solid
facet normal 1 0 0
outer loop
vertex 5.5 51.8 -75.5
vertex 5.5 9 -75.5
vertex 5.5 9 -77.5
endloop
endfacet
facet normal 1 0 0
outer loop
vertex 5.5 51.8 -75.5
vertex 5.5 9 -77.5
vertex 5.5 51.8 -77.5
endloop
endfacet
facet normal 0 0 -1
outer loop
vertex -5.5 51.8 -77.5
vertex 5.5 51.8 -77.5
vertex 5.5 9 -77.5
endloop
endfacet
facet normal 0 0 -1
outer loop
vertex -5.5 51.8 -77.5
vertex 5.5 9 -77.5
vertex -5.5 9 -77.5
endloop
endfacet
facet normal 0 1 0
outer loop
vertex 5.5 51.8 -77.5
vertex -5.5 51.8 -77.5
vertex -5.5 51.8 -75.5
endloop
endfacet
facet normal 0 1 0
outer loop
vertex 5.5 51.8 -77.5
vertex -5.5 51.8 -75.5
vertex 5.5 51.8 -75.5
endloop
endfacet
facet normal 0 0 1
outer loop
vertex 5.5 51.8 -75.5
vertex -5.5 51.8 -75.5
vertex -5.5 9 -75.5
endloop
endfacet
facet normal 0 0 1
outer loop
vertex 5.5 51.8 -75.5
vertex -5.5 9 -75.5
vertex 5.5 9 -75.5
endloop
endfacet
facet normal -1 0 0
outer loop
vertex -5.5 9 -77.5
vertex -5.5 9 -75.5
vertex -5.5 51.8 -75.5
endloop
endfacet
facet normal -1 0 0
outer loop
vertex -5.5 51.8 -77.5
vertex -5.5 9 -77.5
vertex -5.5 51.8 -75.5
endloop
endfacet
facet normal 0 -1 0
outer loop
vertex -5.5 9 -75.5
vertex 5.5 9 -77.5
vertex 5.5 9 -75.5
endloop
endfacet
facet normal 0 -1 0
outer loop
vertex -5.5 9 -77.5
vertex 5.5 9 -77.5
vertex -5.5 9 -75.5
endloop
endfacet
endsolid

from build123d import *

# Parameters (mm, degrees)
SKETCH1_W                       = 39
SKETCH1_H                       = 155
BOSS_EXTRUDE1_DEPTH             = 2
BOSS_EXTRUDE2_DEPTH             = 58
SKETCH3_W                       = 2
SKETCH3_H                       = 2
BOSS_EXTRUDE3_DEPTH             = 58
SKETCH4_W                       = 2
SKETCH4_H                       = 2
BOSS_EXTRUDE4_DEPTH             = 151
SKETCH6_W                       = 35
SKETCH6_H                       = 2.2
CUT_EXTRUDE1_DEPTH              = 166.496978824
SKETCH7_W                       = 35
SKETCH7_H                       = 2.2
CUT_EXTRUDE2_DEPTH              = 99.744620107
SKETCH5_W                       = 31
SKETCH5_H                       = 2
BOSS_EXTRUDE5_DEPTH             = 2
BOSS_EXTRUDE6_REACH             = 101.932
SKETCH8_W                       = 2
SKETCH8_H                       = 2
BOSS_EXTRUDE6_DIRECTION_2_REACH = 101.932
SKETCH10_W                      = 2
SKETCH10_H                      = 2.2
SKETCH10_W_2                    = 2.2
SKETCH10_H_2                    = 2
BOSS_EXTRUDE8_DEPTH             = 2
SKETCH11_W                      = 2
SKETCH11_H                      = 2.2
SKETCH11_W_2                    = 2.2
SKETCH11_H_2                    = 2
BOSS_EXTRUDE9_DEPTH             = 2
FILLET2_R                       = 2.5
SKETCH14_W                      = 36.5
SKETCH14_H                      = 7.75
BOSS_EXTRUDE10_DEPTH            = 2
SKETCH13_W                      = 31
SKETCH13_H                      = 3
CUT_EXTRUDE4_DEPTH              = 2
FILLET3_R                       = 2
FILLET4_R                       = 0.5
SKETCH15_R                      = 5.1
CUT_EXTRUDE5_DEPTH              = 100.932477203
SKETCH16_R                      = 7.1
BOSS_EXTRUDE11_DEPTH            = 1
FILLET5_R                       = 0.5
FILLET7_R                       = 0.5
CUT_EXTRUDE6_DEPTH              = 100.932477263
CUT_EXTRUDE6_DEPTH_BACK         = 100.932477263
SKETCH18_W                      = 9
SKETCH18_H                      = 51
CUT_EXTRUDE7_DEPTH              = 100.078251902
CUT_EXTRUDE8_DEPTH              = 61.284741021
CUT_EXTRUDE8_DEPTH_BACK         = 61.284741021
SKETCH19_W                      = 11
SKETCH19_H                      = 8.2


with BuildPart() as part:
    # Sketch1 → Boss-Extrude1 (new body)
    with BuildSketch(Plane(origin=(0, 0, 0), x_dir=(1, 0, 0), z_dir=(0, 1, 0))):
        Rectangle(SKETCH1_W, SKETCH1_H)
    extrude(amount=BOSS_EXTRUDE1_DEPTH)

    # Sketch2 → Boss-Extrude2 (add)
    with BuildSketch(Plane(origin=(0, 2, 0), x_dir=(1, 0, 0), z_dir=(0, 1, 0))):
        Polygon((-17.5, -77.5), (-17.5, -75.5), (-17.5, 75.5), (17.5, 75.5), (17.5, -75.5), (17.5, -77.5), (19.5, -77.5), (19.5, 77.5), (-19.5, 77.5), (-19.5, -77.5), align=None)
    extrude(amount=BOSS_EXTRUDE2_DEPTH)

    # Sketch3 → Boss-Extrude3 (add)
    with BuildSketch(Plane(origin=(0, 2, 0), x_dir=(1, 0, 0), z_dir=(0, 1, 0))):
        with Locations((-16.5, -76.5)):
            Rectangle(SKETCH3_W, SKETCH3_H)
        with Locations((-16.5, -72.3)):
            Rectangle(SKETCH3_W, SKETCH3_H)
        with Locations((16.5, -76.5)):
            Rectangle(SKETCH3_W, SKETCH3_H)
        with Locations((16.5, -72.3)):
            Rectangle(SKETCH3_W, SKETCH3_H)
    extrude(amount=BOSS_EXTRUDE3_DEPTH)

    # Sketch4 → Boss-Extrude4 (add)
    with BuildSketch(Plane.XY.offset(-75.5)):
        with Locations((-16.5, 59)):
            Rectangle(SKETCH4_W, SKETCH4_H)
        Polygon((-15.5, 53.8), (-17.5, 51.8), (-17.5, 55.8), (-15.5, 55.8), align=None)
        Polygon((15.5, 55.8), (17.5, 55.8), (17.5, 51.8), (15.5, 53.8), align=None)
        with Locations((16.5, 59)):
            Rectangle(SKETCH4_W, SKETCH4_H)
    extrude(amount=BOSS_EXTRUDE4_DEPTH)

    # Sketch6 → Cut-Extrude1 (cut, through all)
    with BuildSketch(Plane.XY.offset(-75.5)):
        with Locations((0, 56.9)):
            Rectangle(SKETCH6_W, SKETCH6_H)
    extrude(amount=CUT_EXTRUDE1_DEPTH, mode=Mode.SUBTRACT)

    # Sketch7 → Cut-Extrude2 (cut, through all)
    with BuildSketch(Plane(origin=(0, 2, 0), x_dir=(1, 0, 0), z_dir=(0, 1, 0))):
        with Locations((0, -74.4)):
            Rectangle(SKETCH7_W, SKETCH7_H)
    extrude(amount=CUT_EXTRUDE2_DEPTH, mode=Mode.SUBTRACT)

    # Sketch5 → Boss-Extrude5 (add)
    with BuildSketch(Plane(origin=(0, 2, 0), x_dir=(1, 0, 0), z_dir=(0, 1, 0))):
        with Locations((0, -76.5)):
            Rectangle(SKETCH5_W, SKETCH5_H)
        with Locations((0, -72.3)):
            Rectangle(SKETCH5_W, SKETCH5_H)
    extrude(amount=BOSS_EXTRUDE5_DEPTH)

    # Boss-Extrude6: up to this face of the body (flat: up to its plane)
    boss_extrude6_end = Plane(part.part.faces().sort_by_distance((17.5, 26.9, -2.1))[0])
    # Sketch8 → Boss-Extrude6 (add, up to the picked face)
    with BuildSketch(Plane(origin=(0, 0, 0), x_dir=(0, 0, -1), z_dir=(1, 0, 0)), mode=Mode.PRIVATE) as boss_extrude6_sk1:
        with Locations((74.5, 59)):
            Rectangle(SKETCH8_W, SKETCH8_H)
    boss_extrude6_tool1 = split(extrude(boss_extrude6_sk1.sketch, amount=BOSS_EXTRUDE6_REACH, mode=Mode.PRIVATE), bisect_by=boss_extrude6_end, keep=Keep.BOTH, mode=Mode.PRIVATE)
    # Sketch8 → Boss-Extrude6 (add, up to the picked face)
    with BuildSketch(Plane(origin=(0, 0, 0), x_dir=(0, 0, -1), z_dir=(1, 0, 0)), mode=Mode.PRIVATE) as boss_extrude6_sk2:
        Polygon((75.5, 55.8), (73.5, 55.8), (73.5, 53.8), (75.5, 51.8), align=None)
    boss_extrude6_tool2 = split(extrude(boss_extrude6_sk2.sketch, amount=BOSS_EXTRUDE6_REACH, mode=Mode.PRIVATE), bisect_by=boss_extrude6_end, keep=Keep.BOTH, mode=Mode.PRIVATE)
    add(boss_extrude6_tool1.solids().sort_by(Axis((0, 59, -74.5), (1, 0, 0)))[0])
    add(boss_extrude6_tool2.solids().sort_by(Axis((0, 54.244444, -74.611111), (1, 0, 0)))[0])

    # Boss-Extrude6 direction 2: up to this face of the body (flat: up to its plane)
    boss_extrude6_direction_2_end = Plane(part.part.faces().sort_by_distance((-17.5, 26.9, -2.1))[0])
    # Sketch8 → Boss-Extrude6 direction 2 (add, up to the picked face)
    with BuildSketch(Plane(origin=(0, 0, 0), x_dir=(0, 0, -1), z_dir=(1, 0, 0)), mode=Mode.PRIVATE) as boss_extrude6_direction_2_sk1:
        with Locations((74.5, 59)):
            Rectangle(SKETCH8_W, SKETCH8_H)
    boss_extrude6_direction_2_tool1 = split(extrude(boss_extrude6_direction_2_sk1.sketch, amount=-BOSS_EXTRUDE6_DIRECTION_2_REACH, mode=Mode.PRIVATE), bisect_by=boss_extrude6_direction_2_end, keep=Keep.BOTH, mode=Mode.PRIVATE)
    # Sketch8 → Boss-Extrude6 direction 2 (add, up to the picked face)
    with BuildSketch(Plane(origin=(0, 0, 0), x_dir=(0, 0, -1), z_dir=(1, 0, 0)), mode=Mode.PRIVATE) as boss_extrude6_direction_2_sk2:
        Polygon((75.5, 55.8), (73.5, 55.8), (73.5, 53.8), (75.5, 51.8), align=None)
    boss_extrude6_direction_2_tool2 = split(extrude(boss_extrude6_direction_2_sk2.sketch, amount=-BOSS_EXTRUDE6_DIRECTION_2_REACH, mode=Mode.PRIVATE), bisect_by=boss_extrude6_direction_2_end, keep=Keep.BOTH, mode=Mode.PRIVATE)
    add(boss_extrude6_direction_2_tool1.solids().sort_by(Axis((0, 59, -74.5), (-1, 0, 0)))[0])
    add(boss_extrude6_direction_2_tool2.solids().sort_by(Axis((0, 54.244444, -74.611111), (-1, 0, 0)))[0])

    # Sketch10 → Boss-Extrude8 (add)
    with BuildSketch(Plane(origin=(-17.5, 0, 0), x_dir=(0, 0, -1), z_dir=(1, 0, 0))):
        with Locations((-76.5, 56.9)):
            Rectangle(SKETCH10_W, SKETCH10_H)
        with Locations((-74.4, 59)):
            Rectangle(SKETCH10_W_2, SKETCH10_H_2)
    extrude(amount=BOSS_EXTRUDE8_DEPTH)

    # Sketch11 → Boss-Extrude9 (add)
    with BuildSketch(Plane.ZY.offset(-17.5)):
        with Locations((76.5, 56.9)):
            Rectangle(SKETCH11_W, SKETCH11_H)
        with Locations((74.4, 59)):
            Rectangle(SKETCH11_W_2, SKETCH11_H_2)
    extrude(amount=BOSS_EXTRUDE9_DEPTH)

    # Fillet2
    fillet2_edges = [part.edges().sort_by_distance(p)[0] for p in [
        (-17.5, 26.9, 71.3),
        (17.5, 26.9, 71.3),
        (19.5, 30, 77.5),
        (-19.5, 30, 77.5),
        (-19.5, 30, -77.5),
        (-17.5, 26.9, -75.5),
        (17.5, 26.9, -75.5),
        (19.5, 30, -77.5),
        (19.5, 60, 0),
        (-19.5, 60, 0),
        (19.5, 0, 0),
        (-19.5, 0, 0),
        (0, 60, -77.5),
        (0, 0, 77.5),
        (0, 0, -77.5),
        (-17.5, 60, 77.5),
        (17.5, 60, 77.5),
    ]]
    fillet(fillet2_edges, radius=FILLET2_R)

    # Sketch14 → Boss-Extrude10 (add)
    with BuildSketch(Plane.XY.offset(-75.5)):
        with Locations((0, 5.125)):
            Rectangle(SKETCH14_W, SKETCH14_H)
    extrude(amount=BOSS_EXTRUDE10_DEPTH)

    # Sketch13 → Cut-Extrude4 (cut)
    with BuildSketch(Plane(origin=(0, 0, -77.5), x_dir=(-1, 0, 0), z_dir=(0, 0, -1))):
        with Locations((0, 5.5)):
            Rectangle(SKETCH13_W, SKETCH13_H)
    extrude(amount=-CUT_EXTRUDE4_DEPTH, mode=Mode.SUBTRACT)

    # Fillet3
    fillet3_edges = [part.edges().sort_by_distance(p)[0] for p in [
        (0, 9, -73.5),
    ]]
    fillet(fillet3_edges, radius=FILLET3_R - 0.0001)  # a hair under: the kernel refuses the full size

    # Fillet4
    fillet4_edges = [part.edges().sort_by_distance(p)[0] for p in [
        (15.5, 5.5, -75.5),
        (15.5, 4, -76.5),
        (0, 7, -75.5),
        (15.5, 7, -76.5),
        (-15.5, 5.5, -75.5),
        (-15.5, 7, -76.5),
        (0, 4, -75.5),
        (-15.5, 4, -76.5),
        (15.5, 5.5, -77.5),
        (0, 4, -77.5),
        (-15.5, 5.5, -77.5),
        (0, 7, -77.5),
    ]]
    fillet(fillet4_edges, radius=FILLET4_R)

    # Sketch15 → Cut-Extrude5 (cut, through all)
    with BuildSketch(Plane.XZ):
        with Locations(Location((0, 38.75, 0), (0, 0, 270))):
            Circle(SKETCH15_R)
        with Locations(Location((0, -38.75, 0), (0, 0, 270))):
            Circle(SKETCH15_R)
    extrude(amount=-CUT_EXTRUDE5_DEPTH, mode=Mode.SUBTRACT)

    # Sketch16 → Boss-Extrude11 (add)
    with BuildSketch(Plane(origin=(0, 2, 0), x_dir=(1, 0, 0), z_dir=(0, 1, 0))):
        with Locations(Location((0, 38.75, 0), (0, 0, 270))):
            Circle(SKETCH16_R)
        with Locations(Location((0, -38.75, 0), (0, 0, 270))):
            Circle(SKETCH16_R)
    extrude(amount=BOSS_EXTRUDE11_DEPTH)

    # Fillet5
    fillet5_edges = [part.edges().sort_by_distance(p)[0] for p in [
        (0, 2, -45.85),
        (0, 3, -45.85),
        (0, 2, 31.65),
        (0, 3, 31.65),
    ]]
    fillet(fillet5_edges, radius=FILLET5_R - 0.0001)  # a hair under: the kernel refuses the full size

    # Fillet7
    fillet7_edges = [part.edges().sort_by_distance(p)[0] for p in [
        (15.5, 60, 0.75),
        (0, 4, 77.5),
        (0, 60, -73.5),
        (-15.5, 60, 0.75),
        (-15.5, 30.75, 77.5),
        (-15.5, 59.267766953, 76.767766953),
        (15.5, 30.75, 77.5),
        (15.5, 59.267766953, 76.767766953),
    ]]
    fillet(fillet7_edges, radius=FILLET7_R)

    # Sketch17 → Cut-Extrude6 (cut, two sides: drawn at the far end of the back side and taken through both)
    with BuildSketch(Plane.XY.offset(-CUT_EXTRUDE6_DEPTH_BACK)):
        Polygon((19.5, 60), (14.5, 60), (14.5, 9), (0, 9), (0, 0), (19.5, 0), align=None)
        Polygon((-14.5, 60), (-19.5, 60), (-19.5, 0), (0, 0), (0, 9), (-14.5, 9), align=None)
    extrude(amount=CUT_EXTRUDE6_DEPTH + CUT_EXTRUDE6_DEPTH_BACK, mode=Mode.SUBTRACT)

    # Sketch18 → Cut-Extrude7 (cut, through all)
    with BuildSketch(Plane.XY):
        with Locations((-10, 34.5)):
            Rectangle(SKETCH18_W, SKETCH18_H)
        with Locations((10, 34.5)):
            Rectangle(SKETCH18_W, SKETCH18_H)
    extrude(amount=-CUT_EXTRUDE7_DEPTH, mode=Mode.SUBTRACT)

    # Sketch19 → Cut-Extrude8 (cut, two sides: drawn at the far end of the back side and taken through both)
    with BuildSketch(Plane.XY.offset(-75.5).offset(-CUT_EXTRUDE8_DEPTH_BACK)):
        with Locations((0, 55.9)):
            Rectangle(SKETCH19_W, SKETCH19_H)
    extrude(amount=CUT_EXTRUDE8_DEPTH + CUT_EXTRUDE8_DEPTH_BACK, mode=Mode.SUBTRACT)


solid = part.part
